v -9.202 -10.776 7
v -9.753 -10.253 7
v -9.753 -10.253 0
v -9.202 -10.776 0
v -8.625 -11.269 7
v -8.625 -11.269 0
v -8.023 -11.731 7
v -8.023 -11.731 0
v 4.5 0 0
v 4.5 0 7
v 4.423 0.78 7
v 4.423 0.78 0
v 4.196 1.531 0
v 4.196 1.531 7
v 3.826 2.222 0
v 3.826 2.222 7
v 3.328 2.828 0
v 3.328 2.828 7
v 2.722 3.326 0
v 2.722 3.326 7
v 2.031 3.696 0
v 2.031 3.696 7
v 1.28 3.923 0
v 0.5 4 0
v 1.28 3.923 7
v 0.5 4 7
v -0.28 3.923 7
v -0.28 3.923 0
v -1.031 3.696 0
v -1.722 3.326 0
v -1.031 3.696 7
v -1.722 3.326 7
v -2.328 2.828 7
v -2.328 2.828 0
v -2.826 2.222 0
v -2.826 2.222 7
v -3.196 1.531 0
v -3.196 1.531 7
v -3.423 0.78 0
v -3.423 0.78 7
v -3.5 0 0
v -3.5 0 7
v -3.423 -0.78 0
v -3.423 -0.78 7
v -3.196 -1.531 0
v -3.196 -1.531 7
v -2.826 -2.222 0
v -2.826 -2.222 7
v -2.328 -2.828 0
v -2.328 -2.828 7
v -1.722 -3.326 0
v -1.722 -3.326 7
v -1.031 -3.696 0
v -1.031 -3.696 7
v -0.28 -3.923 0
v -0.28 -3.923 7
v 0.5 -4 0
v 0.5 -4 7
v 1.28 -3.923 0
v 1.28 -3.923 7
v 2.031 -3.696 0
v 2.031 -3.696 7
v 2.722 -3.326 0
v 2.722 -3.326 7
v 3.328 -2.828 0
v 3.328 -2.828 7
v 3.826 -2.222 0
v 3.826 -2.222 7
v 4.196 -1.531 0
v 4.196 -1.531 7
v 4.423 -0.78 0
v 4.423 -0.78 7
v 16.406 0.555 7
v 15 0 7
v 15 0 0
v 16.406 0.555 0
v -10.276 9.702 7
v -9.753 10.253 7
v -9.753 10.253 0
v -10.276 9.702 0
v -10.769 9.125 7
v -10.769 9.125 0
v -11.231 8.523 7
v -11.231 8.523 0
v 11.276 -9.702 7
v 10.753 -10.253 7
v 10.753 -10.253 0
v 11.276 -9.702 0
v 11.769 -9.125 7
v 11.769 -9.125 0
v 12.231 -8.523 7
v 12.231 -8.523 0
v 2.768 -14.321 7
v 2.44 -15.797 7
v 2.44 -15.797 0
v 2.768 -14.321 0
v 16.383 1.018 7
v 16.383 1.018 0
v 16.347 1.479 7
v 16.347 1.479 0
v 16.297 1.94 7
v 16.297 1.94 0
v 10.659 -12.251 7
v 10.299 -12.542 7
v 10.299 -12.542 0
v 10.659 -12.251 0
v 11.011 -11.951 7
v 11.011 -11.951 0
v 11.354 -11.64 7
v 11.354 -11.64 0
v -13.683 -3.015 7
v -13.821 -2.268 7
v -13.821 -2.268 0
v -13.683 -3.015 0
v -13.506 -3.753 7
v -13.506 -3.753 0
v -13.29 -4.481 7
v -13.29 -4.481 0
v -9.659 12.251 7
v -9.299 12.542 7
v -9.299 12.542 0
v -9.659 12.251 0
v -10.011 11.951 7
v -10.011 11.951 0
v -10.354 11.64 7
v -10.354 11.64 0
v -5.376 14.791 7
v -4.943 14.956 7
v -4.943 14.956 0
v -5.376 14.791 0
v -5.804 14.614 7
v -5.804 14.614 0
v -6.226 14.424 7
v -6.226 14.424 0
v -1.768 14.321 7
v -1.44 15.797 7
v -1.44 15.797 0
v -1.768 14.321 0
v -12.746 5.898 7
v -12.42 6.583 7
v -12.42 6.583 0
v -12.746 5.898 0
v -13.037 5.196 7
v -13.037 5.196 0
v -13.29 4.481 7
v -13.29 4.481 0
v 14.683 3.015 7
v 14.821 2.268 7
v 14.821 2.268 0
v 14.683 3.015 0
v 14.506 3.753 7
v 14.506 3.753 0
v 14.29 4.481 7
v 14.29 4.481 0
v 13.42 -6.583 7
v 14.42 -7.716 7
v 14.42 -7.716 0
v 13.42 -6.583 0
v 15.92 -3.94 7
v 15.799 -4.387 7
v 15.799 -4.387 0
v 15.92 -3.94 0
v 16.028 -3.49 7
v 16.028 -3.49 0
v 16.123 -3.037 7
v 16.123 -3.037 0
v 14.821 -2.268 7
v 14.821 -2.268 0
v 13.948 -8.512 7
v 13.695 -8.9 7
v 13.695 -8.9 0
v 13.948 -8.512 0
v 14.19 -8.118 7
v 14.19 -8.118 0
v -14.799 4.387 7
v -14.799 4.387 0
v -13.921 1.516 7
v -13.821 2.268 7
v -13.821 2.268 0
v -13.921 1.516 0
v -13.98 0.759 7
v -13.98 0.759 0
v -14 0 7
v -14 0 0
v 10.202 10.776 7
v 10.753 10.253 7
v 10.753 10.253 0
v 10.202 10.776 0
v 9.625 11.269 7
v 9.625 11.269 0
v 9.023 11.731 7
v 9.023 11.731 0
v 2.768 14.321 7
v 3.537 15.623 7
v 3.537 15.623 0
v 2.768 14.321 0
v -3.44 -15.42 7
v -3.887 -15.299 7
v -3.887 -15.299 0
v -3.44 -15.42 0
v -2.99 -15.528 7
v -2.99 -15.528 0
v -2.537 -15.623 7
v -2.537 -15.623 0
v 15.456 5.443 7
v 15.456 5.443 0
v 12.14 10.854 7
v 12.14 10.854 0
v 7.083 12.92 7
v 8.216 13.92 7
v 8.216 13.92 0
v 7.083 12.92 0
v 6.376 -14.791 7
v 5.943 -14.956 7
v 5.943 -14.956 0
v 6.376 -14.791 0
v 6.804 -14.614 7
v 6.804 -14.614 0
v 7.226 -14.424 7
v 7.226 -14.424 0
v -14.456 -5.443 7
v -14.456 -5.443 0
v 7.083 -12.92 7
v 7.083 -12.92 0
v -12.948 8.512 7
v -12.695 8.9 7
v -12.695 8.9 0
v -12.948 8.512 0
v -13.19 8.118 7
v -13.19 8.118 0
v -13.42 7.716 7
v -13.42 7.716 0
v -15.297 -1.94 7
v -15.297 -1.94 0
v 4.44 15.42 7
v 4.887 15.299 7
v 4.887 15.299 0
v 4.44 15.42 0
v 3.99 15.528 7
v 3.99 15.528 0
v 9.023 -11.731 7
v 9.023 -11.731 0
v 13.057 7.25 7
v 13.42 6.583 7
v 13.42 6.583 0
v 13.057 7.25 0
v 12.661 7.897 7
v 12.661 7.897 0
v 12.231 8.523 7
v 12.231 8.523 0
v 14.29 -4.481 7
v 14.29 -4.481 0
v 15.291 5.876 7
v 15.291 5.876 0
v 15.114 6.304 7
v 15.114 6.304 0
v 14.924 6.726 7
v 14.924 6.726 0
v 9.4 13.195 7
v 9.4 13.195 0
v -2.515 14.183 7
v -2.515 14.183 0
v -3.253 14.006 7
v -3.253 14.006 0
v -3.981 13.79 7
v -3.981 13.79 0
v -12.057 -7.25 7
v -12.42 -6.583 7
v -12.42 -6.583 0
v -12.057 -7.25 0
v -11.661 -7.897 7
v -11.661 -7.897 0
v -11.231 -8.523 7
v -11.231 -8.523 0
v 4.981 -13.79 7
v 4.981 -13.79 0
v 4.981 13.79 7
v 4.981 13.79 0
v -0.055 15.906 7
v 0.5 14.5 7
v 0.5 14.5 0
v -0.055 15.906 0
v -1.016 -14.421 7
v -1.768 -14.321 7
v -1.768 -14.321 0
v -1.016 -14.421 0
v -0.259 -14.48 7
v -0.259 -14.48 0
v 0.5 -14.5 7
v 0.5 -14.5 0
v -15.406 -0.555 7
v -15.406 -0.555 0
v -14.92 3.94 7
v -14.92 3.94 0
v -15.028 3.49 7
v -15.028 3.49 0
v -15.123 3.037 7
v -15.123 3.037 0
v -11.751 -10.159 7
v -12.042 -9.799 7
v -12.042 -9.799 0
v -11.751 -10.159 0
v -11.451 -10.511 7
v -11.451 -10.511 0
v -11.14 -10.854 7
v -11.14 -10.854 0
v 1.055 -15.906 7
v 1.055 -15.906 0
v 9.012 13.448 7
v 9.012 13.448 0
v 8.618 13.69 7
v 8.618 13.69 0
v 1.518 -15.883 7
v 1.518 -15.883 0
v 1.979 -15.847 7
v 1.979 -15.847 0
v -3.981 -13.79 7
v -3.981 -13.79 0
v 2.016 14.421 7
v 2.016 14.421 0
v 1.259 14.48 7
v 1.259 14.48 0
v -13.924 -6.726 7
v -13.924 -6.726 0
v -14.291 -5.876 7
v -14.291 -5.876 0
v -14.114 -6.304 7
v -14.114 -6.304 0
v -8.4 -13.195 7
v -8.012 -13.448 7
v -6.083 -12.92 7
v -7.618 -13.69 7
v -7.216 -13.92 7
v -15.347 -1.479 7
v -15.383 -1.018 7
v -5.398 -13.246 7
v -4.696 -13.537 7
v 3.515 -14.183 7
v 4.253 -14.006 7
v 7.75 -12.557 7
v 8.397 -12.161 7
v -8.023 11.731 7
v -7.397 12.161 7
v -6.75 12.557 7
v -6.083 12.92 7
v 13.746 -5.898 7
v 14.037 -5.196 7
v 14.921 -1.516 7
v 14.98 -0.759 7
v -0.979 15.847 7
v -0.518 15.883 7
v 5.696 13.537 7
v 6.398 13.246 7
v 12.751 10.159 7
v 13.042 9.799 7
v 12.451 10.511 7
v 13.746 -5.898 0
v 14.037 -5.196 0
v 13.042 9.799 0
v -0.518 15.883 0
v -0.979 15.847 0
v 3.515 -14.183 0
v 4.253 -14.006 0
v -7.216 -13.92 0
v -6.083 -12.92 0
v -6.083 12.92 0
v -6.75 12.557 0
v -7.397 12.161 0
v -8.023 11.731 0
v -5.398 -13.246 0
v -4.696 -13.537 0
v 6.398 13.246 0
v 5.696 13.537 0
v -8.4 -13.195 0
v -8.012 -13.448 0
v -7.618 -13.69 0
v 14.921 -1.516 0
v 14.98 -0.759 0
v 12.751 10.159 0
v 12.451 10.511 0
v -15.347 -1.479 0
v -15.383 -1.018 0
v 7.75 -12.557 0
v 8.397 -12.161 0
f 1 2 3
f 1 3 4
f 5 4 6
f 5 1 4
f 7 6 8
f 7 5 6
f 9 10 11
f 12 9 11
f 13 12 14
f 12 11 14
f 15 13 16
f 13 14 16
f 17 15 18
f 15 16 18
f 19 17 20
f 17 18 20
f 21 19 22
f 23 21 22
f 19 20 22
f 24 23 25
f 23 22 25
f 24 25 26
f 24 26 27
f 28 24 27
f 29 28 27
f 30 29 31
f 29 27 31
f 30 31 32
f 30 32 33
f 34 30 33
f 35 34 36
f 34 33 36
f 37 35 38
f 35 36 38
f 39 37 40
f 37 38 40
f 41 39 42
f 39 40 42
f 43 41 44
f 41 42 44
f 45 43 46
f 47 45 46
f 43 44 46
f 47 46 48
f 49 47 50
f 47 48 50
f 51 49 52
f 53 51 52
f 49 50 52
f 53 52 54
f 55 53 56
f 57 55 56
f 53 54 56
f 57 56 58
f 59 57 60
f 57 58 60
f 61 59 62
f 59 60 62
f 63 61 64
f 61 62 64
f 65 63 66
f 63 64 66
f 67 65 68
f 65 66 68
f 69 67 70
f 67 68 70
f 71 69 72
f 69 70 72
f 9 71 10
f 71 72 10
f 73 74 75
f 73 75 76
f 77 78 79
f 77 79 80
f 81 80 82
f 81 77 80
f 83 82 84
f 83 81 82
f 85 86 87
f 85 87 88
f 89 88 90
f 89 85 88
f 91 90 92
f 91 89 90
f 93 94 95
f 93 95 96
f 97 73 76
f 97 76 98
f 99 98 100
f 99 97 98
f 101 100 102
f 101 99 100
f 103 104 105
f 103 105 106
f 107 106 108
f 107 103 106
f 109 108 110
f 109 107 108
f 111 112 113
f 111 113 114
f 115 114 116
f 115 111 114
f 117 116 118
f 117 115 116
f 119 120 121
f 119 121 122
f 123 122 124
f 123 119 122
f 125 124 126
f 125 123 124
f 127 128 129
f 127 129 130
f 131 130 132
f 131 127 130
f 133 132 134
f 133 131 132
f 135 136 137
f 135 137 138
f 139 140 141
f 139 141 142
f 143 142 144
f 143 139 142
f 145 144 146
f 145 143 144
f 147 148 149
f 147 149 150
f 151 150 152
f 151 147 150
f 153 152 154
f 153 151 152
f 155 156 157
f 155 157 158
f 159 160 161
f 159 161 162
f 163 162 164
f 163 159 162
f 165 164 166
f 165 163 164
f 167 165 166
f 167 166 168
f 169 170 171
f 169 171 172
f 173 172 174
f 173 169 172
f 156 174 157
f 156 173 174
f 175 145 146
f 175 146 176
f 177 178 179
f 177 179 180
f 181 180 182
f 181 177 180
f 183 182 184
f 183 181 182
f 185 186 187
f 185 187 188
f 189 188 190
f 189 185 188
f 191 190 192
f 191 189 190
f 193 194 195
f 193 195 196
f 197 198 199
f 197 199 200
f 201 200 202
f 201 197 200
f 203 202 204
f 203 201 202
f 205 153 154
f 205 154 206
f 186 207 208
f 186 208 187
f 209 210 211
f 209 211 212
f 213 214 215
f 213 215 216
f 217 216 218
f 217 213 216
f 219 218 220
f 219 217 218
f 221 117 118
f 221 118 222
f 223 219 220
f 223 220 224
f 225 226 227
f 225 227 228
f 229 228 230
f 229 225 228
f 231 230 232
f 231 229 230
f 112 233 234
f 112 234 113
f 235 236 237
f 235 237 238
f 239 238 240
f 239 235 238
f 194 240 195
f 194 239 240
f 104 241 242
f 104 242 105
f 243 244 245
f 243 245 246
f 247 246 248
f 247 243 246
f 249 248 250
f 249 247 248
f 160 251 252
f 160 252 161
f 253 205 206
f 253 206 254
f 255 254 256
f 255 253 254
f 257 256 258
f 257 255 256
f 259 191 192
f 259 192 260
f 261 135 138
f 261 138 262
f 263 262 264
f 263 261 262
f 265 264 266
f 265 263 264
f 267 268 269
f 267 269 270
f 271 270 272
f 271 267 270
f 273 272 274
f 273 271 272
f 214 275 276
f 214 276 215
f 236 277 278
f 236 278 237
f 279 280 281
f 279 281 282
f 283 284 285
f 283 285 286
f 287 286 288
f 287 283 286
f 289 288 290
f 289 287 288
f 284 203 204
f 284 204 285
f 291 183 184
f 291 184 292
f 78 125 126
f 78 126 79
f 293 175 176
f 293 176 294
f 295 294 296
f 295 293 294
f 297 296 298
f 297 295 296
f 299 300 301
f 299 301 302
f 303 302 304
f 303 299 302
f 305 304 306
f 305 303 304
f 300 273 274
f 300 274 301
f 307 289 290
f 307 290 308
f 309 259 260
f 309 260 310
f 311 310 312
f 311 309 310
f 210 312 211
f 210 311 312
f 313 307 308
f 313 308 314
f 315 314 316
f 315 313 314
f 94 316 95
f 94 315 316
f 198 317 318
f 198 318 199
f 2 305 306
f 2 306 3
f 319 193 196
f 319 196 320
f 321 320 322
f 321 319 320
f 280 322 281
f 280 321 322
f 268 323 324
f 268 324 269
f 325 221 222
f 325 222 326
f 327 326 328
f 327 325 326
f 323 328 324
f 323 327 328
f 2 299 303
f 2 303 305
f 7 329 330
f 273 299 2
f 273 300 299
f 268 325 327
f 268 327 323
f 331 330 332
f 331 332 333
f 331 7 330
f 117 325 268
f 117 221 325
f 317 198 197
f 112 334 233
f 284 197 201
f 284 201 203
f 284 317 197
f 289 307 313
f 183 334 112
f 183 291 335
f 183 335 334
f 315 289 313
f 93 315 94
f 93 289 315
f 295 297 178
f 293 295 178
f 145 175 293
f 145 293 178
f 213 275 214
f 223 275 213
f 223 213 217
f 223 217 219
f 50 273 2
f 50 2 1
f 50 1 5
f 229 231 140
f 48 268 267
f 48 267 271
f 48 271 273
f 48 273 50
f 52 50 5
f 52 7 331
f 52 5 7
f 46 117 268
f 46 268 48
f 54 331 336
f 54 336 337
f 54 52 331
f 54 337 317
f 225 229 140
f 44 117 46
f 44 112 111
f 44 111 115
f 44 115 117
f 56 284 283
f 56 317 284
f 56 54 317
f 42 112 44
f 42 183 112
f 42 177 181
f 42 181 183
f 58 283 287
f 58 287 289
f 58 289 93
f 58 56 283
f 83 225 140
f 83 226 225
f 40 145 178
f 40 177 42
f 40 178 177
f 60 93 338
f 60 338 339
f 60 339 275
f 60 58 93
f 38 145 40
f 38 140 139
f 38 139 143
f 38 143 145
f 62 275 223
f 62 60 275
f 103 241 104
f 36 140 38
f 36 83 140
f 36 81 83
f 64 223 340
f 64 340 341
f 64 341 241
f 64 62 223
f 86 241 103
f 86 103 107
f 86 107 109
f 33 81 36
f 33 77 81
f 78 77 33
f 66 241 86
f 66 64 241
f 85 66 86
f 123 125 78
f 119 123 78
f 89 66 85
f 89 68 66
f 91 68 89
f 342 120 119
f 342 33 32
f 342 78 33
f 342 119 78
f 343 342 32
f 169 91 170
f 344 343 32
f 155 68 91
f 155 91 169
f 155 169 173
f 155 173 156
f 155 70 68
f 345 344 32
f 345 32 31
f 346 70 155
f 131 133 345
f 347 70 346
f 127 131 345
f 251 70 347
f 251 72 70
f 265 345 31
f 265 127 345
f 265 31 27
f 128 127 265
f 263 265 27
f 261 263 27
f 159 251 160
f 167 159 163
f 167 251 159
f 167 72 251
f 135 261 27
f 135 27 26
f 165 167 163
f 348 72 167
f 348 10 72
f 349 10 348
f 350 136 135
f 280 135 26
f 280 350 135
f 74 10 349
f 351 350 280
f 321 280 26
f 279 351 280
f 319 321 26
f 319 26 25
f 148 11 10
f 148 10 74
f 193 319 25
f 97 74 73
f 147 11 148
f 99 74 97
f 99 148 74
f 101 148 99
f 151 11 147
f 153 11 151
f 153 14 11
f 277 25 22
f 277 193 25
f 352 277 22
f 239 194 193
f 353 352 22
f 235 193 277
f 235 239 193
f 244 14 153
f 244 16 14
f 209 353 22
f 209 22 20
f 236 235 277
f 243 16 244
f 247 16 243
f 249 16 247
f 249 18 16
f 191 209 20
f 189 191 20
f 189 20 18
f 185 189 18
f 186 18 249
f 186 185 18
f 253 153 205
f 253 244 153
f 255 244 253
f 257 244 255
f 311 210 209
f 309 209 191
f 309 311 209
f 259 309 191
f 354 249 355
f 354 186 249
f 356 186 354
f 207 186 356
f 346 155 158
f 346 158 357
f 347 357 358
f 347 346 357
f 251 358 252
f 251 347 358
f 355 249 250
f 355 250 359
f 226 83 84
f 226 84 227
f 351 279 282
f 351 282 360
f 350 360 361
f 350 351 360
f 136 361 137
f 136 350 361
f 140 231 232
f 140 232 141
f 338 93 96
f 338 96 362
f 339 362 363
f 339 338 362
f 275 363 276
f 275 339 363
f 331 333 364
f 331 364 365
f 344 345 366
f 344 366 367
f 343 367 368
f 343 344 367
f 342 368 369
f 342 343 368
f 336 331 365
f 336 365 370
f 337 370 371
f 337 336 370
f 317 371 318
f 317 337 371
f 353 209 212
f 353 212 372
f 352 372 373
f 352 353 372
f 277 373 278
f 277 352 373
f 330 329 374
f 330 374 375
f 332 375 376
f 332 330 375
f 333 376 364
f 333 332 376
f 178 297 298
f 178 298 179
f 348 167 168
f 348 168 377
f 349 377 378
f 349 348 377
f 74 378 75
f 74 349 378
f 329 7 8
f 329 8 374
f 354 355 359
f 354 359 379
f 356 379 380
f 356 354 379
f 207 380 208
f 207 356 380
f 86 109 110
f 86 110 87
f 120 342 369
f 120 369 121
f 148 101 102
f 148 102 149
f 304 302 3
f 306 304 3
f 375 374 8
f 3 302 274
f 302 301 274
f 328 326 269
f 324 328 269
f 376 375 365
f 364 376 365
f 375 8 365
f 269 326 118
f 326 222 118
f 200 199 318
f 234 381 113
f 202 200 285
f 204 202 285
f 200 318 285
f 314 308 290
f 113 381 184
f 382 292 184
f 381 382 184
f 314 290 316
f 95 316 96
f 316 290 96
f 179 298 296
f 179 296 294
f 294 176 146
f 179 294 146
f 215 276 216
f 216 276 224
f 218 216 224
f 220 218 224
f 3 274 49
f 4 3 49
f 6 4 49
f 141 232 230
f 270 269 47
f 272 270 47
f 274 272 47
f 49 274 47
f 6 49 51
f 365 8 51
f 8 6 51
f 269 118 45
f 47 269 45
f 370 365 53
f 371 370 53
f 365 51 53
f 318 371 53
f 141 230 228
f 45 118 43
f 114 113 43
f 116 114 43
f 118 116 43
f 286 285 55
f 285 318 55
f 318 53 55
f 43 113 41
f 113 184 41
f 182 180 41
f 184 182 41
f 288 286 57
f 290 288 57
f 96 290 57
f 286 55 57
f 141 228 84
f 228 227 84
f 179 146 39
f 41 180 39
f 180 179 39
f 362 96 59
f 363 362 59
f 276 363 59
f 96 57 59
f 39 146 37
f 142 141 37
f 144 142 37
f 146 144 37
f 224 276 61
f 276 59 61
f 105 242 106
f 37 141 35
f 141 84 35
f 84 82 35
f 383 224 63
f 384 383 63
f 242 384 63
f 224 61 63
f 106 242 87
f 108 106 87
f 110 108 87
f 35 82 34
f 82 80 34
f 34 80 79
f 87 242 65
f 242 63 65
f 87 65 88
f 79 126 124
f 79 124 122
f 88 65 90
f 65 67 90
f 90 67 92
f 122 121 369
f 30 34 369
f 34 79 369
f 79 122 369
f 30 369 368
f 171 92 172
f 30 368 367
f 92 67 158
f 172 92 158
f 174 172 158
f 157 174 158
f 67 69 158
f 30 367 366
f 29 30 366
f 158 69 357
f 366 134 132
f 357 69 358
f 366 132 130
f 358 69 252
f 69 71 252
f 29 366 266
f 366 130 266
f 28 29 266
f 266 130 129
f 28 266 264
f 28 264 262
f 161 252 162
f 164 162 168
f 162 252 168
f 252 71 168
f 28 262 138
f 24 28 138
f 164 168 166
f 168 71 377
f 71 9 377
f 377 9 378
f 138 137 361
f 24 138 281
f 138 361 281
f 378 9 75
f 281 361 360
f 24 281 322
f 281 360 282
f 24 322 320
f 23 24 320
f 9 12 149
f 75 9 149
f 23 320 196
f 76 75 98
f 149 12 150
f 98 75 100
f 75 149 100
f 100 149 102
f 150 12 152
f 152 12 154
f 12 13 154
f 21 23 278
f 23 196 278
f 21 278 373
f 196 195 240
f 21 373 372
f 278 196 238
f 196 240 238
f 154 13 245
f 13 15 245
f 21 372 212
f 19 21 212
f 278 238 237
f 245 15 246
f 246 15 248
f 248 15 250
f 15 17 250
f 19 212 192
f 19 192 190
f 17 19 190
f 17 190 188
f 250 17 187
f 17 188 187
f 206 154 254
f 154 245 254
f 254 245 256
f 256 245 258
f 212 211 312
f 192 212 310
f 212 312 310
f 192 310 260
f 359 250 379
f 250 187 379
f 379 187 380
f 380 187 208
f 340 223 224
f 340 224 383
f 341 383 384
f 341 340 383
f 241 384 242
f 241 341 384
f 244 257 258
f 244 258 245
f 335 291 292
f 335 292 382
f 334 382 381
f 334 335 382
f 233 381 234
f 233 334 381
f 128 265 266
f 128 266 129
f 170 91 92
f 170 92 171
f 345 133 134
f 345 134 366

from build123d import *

# Parameters (mm, degrees)
SKETCH1_R           = 4
BOSS_EXTRUDE1_DEPTH = 7


with BuildPart() as part:
    # Sketch1 → Boss-Extrude1 (new body)
    with BuildSketch(Plane.XY.offset(7)):
        with BuildLine():
            Line((16.296858351, 1.939610316), (14.821480939, 2.268299743))
            ThreePointArc((14.821480939, 2.268299743), (14.599363846, 3.384957776), (14.290319486, 4.480746418))
            Line((14.290319486, 4.480746418), (15.455668509, 5.443418171))
            ThreePointArc((15.455668509, 5.443418171), (15.203995461, 6.090594341), (14.924332522, 6.726176719))
            Line((14.924332522, 6.726176719), (13.419594601, 6.582862246))
            ThreePointArc((13.419594601, 6.582862246), (12.863282383, 7.576229188), (12.230746418, 8.522886158))
            Line((12.230746418, 8.522886158), (13.041577269, 9.798554054))
            ThreePointArc((13.041577269, 9.798554054), (12.602233541, 10.336283919), (12.139852525, 10.85433808))
            Line((12.139852525, 10.85433808), (10.753048327, 10.253048327))
            ThreePointArc((10.753048327, 10.253048327), (9.916996701, 11.025886501), (9.022886158, 11.730746418))
            Line((9.022886158, 11.730746418), (9.399829063, 13.194539196))
            ThreePointArc((9.399829063, 13.194539196), (8.815820682, 13.570186009), (8.215982663, 13.920001203))
            Line((8.215982663, 13.920001203), (7.082862246, 12.919594601))
            ThreePointArc((7.082862246, 12.919594601), (6.048909769, 13.396253221), (4.980746418, 13.790319486))
            Line((4.980746418, 13.790319486), (4.88690358, 15.298950909))
            ThreePointArc((4.88690358, 15.298950909), (4.215397354, 15.475743744), (3.536818658, 15.623077622))
            Line((3.536818658, 15.623077622), (2.768299743, 14.321480939))
            ThreePointArc((2.768299743, 14.321480939), (1.637656888, 14.455301339), (0.5, 14.5))
            Line((0.5, 14.5), (-0.055442591, 15.905794714))
            ThreePointArc((-0.055442591, 15.905794714), (-0.748714953, 15.866427856), (-1.439610316, 15.796858351))
            Line((-1.439610316, 15.796858351), (-1.768299743, 14.321480939))
            ThreePointArc((-1.768299743, 14.321480939), (-2.884957776, 14.099363846), (-3.980746418, 13.790319486))
            Line((-3.980746418, 13.790319486), (-4.943418171, 14.955668509))
            ThreePointArc((-4.943418171, 14.955668509), (-5.590594341, 14.703995461), (-6.226176719, 14.424332522))
            Line((-6.226176719, 14.424332522), (-6.082862246, 12.919594601))
            ThreePointArc((-6.082862246, 12.919594601), (-7.076229188, 12.363282383), (-8.022886158, 11.730746418))
            Line((-8.022886158, 11.730746418), (-9.298554054, 12.541577269))
            ThreePointArc((-9.298554054, 12.541577269), (-9.836283919, 12.102233541), (-10.35433808, 11.639852525))
            Line((-10.35433808, 11.639852525), (-9.753048327, 10.253048327))
            ThreePointArc((-9.753048327, 10.253048327), (-10.525886501, 9.416996701), (-11.230746418, 8.522886158))
            Line((-11.230746418, 8.522886158), (-12.694539196, 8.899829063))
            ThreePointArc((-12.694539196, 8.899829063), (-13.070186009, 8.315820682), (-13.420001203, 7.715982663))
            Line((-13.420001203, 7.715982663), (-12.419594601, 6.582862246))
            ThreePointArc((-12.419594601, 6.582862246), (-12.896253221, 5.548909769), (-13.290319486, 4.480746418))
            Line((-13.290319486, 4.480746418), (-14.798950909, 4.38690358))
            ThreePointArc((-14.798950909, 4.38690358), (-14.975743744, 3.715397354), (-15.123077622, 3.036818658))
            Line((-15.123077622, 3.036818658), (-13.821480939, 2.268299743))
            ThreePointArc((-13.821480939, 2.268299743), (-13.955301339, 1.137656888), (-14, 0))
            Line((-14, 0), (-15.405794714, -0.555442591))
            ThreePointArc((-15.405794714, -0.555442591), (-15.366427856, -1.248714953), (-15.296858351, -1.939610316))
            Line((-15.296858351, -1.939610316), (-13.821480939, -2.268299743))
            ThreePointArc((-13.821480939, -2.268299743), (-13.599363846, -3.384957776), (-13.290319486, -4.480746418))
            Line((-13.290319486, -4.480746418), (-14.455668509, -5.443418171))
            ThreePointArc((-14.455668509, -5.443418171), (-14.203995461, -6.090594341), (-13.924332522, -6.726176719))
            Line((-13.924332522, -6.726176719), (-12.419594601, -6.582862246))
            ThreePointArc((-12.419594601, -6.582862246), (-11.863282383, -7.576229188), (-11.230746418, -8.522886158))
            Line((-11.230746418, -8.522886158), (-12.041577269, -9.798554054))
            ThreePointArc((-12.041577269, -9.798554054), (-11.602233541, -10.336283919), (-11.139852525, -10.85433808))
            Line((-11.139852525, -10.85433808), (-9.753048327, -10.253048327))
            ThreePointArc((-9.753048327, -10.253048327), (-8.916996701, -11.025886501), (-8.022886158, -11.730746418))
            Line((-8.022886158, -11.730746418), (-8.399829063, -13.194539196))
            ThreePointArc((-8.399829063, -13.194539196), (-7.815820682, -13.570186009), (-7.215982663, -13.920001203))
            Line((-7.215982663, -13.920001203), (-6.082862246, -12.919594601))
            ThreePointArc((-6.082862246, -12.919594601), (-5.048909769, -13.396253221), (-3.980746418, -13.790319486))
            Line((-3.980746418, -13.790319486), (-3.88690358, -15.298950909))
            ThreePointArc((-3.88690358, -15.298950909), (-3.215397354, -15.475743744), (-2.536818658, -15.623077622))
            Line((-2.536818658, -15.623077622), (-1.768299743, -14.321480939))
            ThreePointArc((-1.768299743, -14.321480939), (-0.637656888, -14.455301339), (0.5, -14.5))
            Line((0.5, -14.5), (1.055442591, -15.905794714))
            ThreePointArc((1.055442591, -15.905794714), (1.748714953, -15.866427856), (2.439610316, -15.796858351))
            Line((2.439610316, -15.796858351), (2.768299743, -14.321480939))
            ThreePointArc((2.768299743, -14.321480939), (3.884957776, -14.099363846), (4.980746418, -13.790319486))
            Line((4.980746418, -13.790319486), (5.943418171, -14.955668509))
            ThreePointArc((5.943418171, -14.955668509), (6.590594341, -14.703995461), (7.226176719, -14.424332522))
            Line((7.226176719, -14.424332522), (7.082862246, -12.919594601))
            ThreePointArc((7.082862246, -12.919594601), (8.076229188, -12.363282383), (9.022886158, -11.730746418))
            Line((9.022886158, -11.730746418), (10.298554054, -12.541577269))
            ThreePointArc((10.298554054, -12.541577269), (10.836283919, -12.102233541), (11.35433808, -11.639852525))
            Line((11.35433808, -11.639852525), (10.753048327, -10.253048327))
            ThreePointArc((10.753048327, -10.253048327), (11.525886501, -9.416996701), (12.230746418, -8.522886158))
            Line((12.230746418, -8.522886158), (13.694539196, -8.899829063))
            ThreePointArc((13.694539196, -8.899829063), (14.070186009, -8.315820682), (14.420001203, -7.715982663))
            Line((14.420001203, -7.715982663), (13.419594601, -6.582862246))
            ThreePointArc((13.419594601, -6.582862246), (13.896253221, -5.548909769), (14.290319486, -4.480746418))
            Line((14.290319486, -4.480746418), (15.798950909, -4.38690358))
            ThreePointArc((15.798950909, -4.38690358), (15.975743744, -3.715397354), (16.123077622, -3.036818658))
            Line((16.123077622, -3.036818658), (14.821480939, -2.268299743))
            ThreePointArc((14.821480939, -2.268299743), (14.955301339, -1.137656888), (15, 0))
            Line((15, 0), (16.405794714, 0.555442591))
            ThreePointArc((16.405794714, 0.555442591), (16.366427856, 1.248714953), (16.296858351, 1.939610316))
        make_face()
        with Locations((0.5, 0)):
            Circle(SKETCH1_R, mode=Mode.SUBTRACT)
    extrude(amount=-BOSS_EXTRUDE1_DEPTH)


solid = part.part
